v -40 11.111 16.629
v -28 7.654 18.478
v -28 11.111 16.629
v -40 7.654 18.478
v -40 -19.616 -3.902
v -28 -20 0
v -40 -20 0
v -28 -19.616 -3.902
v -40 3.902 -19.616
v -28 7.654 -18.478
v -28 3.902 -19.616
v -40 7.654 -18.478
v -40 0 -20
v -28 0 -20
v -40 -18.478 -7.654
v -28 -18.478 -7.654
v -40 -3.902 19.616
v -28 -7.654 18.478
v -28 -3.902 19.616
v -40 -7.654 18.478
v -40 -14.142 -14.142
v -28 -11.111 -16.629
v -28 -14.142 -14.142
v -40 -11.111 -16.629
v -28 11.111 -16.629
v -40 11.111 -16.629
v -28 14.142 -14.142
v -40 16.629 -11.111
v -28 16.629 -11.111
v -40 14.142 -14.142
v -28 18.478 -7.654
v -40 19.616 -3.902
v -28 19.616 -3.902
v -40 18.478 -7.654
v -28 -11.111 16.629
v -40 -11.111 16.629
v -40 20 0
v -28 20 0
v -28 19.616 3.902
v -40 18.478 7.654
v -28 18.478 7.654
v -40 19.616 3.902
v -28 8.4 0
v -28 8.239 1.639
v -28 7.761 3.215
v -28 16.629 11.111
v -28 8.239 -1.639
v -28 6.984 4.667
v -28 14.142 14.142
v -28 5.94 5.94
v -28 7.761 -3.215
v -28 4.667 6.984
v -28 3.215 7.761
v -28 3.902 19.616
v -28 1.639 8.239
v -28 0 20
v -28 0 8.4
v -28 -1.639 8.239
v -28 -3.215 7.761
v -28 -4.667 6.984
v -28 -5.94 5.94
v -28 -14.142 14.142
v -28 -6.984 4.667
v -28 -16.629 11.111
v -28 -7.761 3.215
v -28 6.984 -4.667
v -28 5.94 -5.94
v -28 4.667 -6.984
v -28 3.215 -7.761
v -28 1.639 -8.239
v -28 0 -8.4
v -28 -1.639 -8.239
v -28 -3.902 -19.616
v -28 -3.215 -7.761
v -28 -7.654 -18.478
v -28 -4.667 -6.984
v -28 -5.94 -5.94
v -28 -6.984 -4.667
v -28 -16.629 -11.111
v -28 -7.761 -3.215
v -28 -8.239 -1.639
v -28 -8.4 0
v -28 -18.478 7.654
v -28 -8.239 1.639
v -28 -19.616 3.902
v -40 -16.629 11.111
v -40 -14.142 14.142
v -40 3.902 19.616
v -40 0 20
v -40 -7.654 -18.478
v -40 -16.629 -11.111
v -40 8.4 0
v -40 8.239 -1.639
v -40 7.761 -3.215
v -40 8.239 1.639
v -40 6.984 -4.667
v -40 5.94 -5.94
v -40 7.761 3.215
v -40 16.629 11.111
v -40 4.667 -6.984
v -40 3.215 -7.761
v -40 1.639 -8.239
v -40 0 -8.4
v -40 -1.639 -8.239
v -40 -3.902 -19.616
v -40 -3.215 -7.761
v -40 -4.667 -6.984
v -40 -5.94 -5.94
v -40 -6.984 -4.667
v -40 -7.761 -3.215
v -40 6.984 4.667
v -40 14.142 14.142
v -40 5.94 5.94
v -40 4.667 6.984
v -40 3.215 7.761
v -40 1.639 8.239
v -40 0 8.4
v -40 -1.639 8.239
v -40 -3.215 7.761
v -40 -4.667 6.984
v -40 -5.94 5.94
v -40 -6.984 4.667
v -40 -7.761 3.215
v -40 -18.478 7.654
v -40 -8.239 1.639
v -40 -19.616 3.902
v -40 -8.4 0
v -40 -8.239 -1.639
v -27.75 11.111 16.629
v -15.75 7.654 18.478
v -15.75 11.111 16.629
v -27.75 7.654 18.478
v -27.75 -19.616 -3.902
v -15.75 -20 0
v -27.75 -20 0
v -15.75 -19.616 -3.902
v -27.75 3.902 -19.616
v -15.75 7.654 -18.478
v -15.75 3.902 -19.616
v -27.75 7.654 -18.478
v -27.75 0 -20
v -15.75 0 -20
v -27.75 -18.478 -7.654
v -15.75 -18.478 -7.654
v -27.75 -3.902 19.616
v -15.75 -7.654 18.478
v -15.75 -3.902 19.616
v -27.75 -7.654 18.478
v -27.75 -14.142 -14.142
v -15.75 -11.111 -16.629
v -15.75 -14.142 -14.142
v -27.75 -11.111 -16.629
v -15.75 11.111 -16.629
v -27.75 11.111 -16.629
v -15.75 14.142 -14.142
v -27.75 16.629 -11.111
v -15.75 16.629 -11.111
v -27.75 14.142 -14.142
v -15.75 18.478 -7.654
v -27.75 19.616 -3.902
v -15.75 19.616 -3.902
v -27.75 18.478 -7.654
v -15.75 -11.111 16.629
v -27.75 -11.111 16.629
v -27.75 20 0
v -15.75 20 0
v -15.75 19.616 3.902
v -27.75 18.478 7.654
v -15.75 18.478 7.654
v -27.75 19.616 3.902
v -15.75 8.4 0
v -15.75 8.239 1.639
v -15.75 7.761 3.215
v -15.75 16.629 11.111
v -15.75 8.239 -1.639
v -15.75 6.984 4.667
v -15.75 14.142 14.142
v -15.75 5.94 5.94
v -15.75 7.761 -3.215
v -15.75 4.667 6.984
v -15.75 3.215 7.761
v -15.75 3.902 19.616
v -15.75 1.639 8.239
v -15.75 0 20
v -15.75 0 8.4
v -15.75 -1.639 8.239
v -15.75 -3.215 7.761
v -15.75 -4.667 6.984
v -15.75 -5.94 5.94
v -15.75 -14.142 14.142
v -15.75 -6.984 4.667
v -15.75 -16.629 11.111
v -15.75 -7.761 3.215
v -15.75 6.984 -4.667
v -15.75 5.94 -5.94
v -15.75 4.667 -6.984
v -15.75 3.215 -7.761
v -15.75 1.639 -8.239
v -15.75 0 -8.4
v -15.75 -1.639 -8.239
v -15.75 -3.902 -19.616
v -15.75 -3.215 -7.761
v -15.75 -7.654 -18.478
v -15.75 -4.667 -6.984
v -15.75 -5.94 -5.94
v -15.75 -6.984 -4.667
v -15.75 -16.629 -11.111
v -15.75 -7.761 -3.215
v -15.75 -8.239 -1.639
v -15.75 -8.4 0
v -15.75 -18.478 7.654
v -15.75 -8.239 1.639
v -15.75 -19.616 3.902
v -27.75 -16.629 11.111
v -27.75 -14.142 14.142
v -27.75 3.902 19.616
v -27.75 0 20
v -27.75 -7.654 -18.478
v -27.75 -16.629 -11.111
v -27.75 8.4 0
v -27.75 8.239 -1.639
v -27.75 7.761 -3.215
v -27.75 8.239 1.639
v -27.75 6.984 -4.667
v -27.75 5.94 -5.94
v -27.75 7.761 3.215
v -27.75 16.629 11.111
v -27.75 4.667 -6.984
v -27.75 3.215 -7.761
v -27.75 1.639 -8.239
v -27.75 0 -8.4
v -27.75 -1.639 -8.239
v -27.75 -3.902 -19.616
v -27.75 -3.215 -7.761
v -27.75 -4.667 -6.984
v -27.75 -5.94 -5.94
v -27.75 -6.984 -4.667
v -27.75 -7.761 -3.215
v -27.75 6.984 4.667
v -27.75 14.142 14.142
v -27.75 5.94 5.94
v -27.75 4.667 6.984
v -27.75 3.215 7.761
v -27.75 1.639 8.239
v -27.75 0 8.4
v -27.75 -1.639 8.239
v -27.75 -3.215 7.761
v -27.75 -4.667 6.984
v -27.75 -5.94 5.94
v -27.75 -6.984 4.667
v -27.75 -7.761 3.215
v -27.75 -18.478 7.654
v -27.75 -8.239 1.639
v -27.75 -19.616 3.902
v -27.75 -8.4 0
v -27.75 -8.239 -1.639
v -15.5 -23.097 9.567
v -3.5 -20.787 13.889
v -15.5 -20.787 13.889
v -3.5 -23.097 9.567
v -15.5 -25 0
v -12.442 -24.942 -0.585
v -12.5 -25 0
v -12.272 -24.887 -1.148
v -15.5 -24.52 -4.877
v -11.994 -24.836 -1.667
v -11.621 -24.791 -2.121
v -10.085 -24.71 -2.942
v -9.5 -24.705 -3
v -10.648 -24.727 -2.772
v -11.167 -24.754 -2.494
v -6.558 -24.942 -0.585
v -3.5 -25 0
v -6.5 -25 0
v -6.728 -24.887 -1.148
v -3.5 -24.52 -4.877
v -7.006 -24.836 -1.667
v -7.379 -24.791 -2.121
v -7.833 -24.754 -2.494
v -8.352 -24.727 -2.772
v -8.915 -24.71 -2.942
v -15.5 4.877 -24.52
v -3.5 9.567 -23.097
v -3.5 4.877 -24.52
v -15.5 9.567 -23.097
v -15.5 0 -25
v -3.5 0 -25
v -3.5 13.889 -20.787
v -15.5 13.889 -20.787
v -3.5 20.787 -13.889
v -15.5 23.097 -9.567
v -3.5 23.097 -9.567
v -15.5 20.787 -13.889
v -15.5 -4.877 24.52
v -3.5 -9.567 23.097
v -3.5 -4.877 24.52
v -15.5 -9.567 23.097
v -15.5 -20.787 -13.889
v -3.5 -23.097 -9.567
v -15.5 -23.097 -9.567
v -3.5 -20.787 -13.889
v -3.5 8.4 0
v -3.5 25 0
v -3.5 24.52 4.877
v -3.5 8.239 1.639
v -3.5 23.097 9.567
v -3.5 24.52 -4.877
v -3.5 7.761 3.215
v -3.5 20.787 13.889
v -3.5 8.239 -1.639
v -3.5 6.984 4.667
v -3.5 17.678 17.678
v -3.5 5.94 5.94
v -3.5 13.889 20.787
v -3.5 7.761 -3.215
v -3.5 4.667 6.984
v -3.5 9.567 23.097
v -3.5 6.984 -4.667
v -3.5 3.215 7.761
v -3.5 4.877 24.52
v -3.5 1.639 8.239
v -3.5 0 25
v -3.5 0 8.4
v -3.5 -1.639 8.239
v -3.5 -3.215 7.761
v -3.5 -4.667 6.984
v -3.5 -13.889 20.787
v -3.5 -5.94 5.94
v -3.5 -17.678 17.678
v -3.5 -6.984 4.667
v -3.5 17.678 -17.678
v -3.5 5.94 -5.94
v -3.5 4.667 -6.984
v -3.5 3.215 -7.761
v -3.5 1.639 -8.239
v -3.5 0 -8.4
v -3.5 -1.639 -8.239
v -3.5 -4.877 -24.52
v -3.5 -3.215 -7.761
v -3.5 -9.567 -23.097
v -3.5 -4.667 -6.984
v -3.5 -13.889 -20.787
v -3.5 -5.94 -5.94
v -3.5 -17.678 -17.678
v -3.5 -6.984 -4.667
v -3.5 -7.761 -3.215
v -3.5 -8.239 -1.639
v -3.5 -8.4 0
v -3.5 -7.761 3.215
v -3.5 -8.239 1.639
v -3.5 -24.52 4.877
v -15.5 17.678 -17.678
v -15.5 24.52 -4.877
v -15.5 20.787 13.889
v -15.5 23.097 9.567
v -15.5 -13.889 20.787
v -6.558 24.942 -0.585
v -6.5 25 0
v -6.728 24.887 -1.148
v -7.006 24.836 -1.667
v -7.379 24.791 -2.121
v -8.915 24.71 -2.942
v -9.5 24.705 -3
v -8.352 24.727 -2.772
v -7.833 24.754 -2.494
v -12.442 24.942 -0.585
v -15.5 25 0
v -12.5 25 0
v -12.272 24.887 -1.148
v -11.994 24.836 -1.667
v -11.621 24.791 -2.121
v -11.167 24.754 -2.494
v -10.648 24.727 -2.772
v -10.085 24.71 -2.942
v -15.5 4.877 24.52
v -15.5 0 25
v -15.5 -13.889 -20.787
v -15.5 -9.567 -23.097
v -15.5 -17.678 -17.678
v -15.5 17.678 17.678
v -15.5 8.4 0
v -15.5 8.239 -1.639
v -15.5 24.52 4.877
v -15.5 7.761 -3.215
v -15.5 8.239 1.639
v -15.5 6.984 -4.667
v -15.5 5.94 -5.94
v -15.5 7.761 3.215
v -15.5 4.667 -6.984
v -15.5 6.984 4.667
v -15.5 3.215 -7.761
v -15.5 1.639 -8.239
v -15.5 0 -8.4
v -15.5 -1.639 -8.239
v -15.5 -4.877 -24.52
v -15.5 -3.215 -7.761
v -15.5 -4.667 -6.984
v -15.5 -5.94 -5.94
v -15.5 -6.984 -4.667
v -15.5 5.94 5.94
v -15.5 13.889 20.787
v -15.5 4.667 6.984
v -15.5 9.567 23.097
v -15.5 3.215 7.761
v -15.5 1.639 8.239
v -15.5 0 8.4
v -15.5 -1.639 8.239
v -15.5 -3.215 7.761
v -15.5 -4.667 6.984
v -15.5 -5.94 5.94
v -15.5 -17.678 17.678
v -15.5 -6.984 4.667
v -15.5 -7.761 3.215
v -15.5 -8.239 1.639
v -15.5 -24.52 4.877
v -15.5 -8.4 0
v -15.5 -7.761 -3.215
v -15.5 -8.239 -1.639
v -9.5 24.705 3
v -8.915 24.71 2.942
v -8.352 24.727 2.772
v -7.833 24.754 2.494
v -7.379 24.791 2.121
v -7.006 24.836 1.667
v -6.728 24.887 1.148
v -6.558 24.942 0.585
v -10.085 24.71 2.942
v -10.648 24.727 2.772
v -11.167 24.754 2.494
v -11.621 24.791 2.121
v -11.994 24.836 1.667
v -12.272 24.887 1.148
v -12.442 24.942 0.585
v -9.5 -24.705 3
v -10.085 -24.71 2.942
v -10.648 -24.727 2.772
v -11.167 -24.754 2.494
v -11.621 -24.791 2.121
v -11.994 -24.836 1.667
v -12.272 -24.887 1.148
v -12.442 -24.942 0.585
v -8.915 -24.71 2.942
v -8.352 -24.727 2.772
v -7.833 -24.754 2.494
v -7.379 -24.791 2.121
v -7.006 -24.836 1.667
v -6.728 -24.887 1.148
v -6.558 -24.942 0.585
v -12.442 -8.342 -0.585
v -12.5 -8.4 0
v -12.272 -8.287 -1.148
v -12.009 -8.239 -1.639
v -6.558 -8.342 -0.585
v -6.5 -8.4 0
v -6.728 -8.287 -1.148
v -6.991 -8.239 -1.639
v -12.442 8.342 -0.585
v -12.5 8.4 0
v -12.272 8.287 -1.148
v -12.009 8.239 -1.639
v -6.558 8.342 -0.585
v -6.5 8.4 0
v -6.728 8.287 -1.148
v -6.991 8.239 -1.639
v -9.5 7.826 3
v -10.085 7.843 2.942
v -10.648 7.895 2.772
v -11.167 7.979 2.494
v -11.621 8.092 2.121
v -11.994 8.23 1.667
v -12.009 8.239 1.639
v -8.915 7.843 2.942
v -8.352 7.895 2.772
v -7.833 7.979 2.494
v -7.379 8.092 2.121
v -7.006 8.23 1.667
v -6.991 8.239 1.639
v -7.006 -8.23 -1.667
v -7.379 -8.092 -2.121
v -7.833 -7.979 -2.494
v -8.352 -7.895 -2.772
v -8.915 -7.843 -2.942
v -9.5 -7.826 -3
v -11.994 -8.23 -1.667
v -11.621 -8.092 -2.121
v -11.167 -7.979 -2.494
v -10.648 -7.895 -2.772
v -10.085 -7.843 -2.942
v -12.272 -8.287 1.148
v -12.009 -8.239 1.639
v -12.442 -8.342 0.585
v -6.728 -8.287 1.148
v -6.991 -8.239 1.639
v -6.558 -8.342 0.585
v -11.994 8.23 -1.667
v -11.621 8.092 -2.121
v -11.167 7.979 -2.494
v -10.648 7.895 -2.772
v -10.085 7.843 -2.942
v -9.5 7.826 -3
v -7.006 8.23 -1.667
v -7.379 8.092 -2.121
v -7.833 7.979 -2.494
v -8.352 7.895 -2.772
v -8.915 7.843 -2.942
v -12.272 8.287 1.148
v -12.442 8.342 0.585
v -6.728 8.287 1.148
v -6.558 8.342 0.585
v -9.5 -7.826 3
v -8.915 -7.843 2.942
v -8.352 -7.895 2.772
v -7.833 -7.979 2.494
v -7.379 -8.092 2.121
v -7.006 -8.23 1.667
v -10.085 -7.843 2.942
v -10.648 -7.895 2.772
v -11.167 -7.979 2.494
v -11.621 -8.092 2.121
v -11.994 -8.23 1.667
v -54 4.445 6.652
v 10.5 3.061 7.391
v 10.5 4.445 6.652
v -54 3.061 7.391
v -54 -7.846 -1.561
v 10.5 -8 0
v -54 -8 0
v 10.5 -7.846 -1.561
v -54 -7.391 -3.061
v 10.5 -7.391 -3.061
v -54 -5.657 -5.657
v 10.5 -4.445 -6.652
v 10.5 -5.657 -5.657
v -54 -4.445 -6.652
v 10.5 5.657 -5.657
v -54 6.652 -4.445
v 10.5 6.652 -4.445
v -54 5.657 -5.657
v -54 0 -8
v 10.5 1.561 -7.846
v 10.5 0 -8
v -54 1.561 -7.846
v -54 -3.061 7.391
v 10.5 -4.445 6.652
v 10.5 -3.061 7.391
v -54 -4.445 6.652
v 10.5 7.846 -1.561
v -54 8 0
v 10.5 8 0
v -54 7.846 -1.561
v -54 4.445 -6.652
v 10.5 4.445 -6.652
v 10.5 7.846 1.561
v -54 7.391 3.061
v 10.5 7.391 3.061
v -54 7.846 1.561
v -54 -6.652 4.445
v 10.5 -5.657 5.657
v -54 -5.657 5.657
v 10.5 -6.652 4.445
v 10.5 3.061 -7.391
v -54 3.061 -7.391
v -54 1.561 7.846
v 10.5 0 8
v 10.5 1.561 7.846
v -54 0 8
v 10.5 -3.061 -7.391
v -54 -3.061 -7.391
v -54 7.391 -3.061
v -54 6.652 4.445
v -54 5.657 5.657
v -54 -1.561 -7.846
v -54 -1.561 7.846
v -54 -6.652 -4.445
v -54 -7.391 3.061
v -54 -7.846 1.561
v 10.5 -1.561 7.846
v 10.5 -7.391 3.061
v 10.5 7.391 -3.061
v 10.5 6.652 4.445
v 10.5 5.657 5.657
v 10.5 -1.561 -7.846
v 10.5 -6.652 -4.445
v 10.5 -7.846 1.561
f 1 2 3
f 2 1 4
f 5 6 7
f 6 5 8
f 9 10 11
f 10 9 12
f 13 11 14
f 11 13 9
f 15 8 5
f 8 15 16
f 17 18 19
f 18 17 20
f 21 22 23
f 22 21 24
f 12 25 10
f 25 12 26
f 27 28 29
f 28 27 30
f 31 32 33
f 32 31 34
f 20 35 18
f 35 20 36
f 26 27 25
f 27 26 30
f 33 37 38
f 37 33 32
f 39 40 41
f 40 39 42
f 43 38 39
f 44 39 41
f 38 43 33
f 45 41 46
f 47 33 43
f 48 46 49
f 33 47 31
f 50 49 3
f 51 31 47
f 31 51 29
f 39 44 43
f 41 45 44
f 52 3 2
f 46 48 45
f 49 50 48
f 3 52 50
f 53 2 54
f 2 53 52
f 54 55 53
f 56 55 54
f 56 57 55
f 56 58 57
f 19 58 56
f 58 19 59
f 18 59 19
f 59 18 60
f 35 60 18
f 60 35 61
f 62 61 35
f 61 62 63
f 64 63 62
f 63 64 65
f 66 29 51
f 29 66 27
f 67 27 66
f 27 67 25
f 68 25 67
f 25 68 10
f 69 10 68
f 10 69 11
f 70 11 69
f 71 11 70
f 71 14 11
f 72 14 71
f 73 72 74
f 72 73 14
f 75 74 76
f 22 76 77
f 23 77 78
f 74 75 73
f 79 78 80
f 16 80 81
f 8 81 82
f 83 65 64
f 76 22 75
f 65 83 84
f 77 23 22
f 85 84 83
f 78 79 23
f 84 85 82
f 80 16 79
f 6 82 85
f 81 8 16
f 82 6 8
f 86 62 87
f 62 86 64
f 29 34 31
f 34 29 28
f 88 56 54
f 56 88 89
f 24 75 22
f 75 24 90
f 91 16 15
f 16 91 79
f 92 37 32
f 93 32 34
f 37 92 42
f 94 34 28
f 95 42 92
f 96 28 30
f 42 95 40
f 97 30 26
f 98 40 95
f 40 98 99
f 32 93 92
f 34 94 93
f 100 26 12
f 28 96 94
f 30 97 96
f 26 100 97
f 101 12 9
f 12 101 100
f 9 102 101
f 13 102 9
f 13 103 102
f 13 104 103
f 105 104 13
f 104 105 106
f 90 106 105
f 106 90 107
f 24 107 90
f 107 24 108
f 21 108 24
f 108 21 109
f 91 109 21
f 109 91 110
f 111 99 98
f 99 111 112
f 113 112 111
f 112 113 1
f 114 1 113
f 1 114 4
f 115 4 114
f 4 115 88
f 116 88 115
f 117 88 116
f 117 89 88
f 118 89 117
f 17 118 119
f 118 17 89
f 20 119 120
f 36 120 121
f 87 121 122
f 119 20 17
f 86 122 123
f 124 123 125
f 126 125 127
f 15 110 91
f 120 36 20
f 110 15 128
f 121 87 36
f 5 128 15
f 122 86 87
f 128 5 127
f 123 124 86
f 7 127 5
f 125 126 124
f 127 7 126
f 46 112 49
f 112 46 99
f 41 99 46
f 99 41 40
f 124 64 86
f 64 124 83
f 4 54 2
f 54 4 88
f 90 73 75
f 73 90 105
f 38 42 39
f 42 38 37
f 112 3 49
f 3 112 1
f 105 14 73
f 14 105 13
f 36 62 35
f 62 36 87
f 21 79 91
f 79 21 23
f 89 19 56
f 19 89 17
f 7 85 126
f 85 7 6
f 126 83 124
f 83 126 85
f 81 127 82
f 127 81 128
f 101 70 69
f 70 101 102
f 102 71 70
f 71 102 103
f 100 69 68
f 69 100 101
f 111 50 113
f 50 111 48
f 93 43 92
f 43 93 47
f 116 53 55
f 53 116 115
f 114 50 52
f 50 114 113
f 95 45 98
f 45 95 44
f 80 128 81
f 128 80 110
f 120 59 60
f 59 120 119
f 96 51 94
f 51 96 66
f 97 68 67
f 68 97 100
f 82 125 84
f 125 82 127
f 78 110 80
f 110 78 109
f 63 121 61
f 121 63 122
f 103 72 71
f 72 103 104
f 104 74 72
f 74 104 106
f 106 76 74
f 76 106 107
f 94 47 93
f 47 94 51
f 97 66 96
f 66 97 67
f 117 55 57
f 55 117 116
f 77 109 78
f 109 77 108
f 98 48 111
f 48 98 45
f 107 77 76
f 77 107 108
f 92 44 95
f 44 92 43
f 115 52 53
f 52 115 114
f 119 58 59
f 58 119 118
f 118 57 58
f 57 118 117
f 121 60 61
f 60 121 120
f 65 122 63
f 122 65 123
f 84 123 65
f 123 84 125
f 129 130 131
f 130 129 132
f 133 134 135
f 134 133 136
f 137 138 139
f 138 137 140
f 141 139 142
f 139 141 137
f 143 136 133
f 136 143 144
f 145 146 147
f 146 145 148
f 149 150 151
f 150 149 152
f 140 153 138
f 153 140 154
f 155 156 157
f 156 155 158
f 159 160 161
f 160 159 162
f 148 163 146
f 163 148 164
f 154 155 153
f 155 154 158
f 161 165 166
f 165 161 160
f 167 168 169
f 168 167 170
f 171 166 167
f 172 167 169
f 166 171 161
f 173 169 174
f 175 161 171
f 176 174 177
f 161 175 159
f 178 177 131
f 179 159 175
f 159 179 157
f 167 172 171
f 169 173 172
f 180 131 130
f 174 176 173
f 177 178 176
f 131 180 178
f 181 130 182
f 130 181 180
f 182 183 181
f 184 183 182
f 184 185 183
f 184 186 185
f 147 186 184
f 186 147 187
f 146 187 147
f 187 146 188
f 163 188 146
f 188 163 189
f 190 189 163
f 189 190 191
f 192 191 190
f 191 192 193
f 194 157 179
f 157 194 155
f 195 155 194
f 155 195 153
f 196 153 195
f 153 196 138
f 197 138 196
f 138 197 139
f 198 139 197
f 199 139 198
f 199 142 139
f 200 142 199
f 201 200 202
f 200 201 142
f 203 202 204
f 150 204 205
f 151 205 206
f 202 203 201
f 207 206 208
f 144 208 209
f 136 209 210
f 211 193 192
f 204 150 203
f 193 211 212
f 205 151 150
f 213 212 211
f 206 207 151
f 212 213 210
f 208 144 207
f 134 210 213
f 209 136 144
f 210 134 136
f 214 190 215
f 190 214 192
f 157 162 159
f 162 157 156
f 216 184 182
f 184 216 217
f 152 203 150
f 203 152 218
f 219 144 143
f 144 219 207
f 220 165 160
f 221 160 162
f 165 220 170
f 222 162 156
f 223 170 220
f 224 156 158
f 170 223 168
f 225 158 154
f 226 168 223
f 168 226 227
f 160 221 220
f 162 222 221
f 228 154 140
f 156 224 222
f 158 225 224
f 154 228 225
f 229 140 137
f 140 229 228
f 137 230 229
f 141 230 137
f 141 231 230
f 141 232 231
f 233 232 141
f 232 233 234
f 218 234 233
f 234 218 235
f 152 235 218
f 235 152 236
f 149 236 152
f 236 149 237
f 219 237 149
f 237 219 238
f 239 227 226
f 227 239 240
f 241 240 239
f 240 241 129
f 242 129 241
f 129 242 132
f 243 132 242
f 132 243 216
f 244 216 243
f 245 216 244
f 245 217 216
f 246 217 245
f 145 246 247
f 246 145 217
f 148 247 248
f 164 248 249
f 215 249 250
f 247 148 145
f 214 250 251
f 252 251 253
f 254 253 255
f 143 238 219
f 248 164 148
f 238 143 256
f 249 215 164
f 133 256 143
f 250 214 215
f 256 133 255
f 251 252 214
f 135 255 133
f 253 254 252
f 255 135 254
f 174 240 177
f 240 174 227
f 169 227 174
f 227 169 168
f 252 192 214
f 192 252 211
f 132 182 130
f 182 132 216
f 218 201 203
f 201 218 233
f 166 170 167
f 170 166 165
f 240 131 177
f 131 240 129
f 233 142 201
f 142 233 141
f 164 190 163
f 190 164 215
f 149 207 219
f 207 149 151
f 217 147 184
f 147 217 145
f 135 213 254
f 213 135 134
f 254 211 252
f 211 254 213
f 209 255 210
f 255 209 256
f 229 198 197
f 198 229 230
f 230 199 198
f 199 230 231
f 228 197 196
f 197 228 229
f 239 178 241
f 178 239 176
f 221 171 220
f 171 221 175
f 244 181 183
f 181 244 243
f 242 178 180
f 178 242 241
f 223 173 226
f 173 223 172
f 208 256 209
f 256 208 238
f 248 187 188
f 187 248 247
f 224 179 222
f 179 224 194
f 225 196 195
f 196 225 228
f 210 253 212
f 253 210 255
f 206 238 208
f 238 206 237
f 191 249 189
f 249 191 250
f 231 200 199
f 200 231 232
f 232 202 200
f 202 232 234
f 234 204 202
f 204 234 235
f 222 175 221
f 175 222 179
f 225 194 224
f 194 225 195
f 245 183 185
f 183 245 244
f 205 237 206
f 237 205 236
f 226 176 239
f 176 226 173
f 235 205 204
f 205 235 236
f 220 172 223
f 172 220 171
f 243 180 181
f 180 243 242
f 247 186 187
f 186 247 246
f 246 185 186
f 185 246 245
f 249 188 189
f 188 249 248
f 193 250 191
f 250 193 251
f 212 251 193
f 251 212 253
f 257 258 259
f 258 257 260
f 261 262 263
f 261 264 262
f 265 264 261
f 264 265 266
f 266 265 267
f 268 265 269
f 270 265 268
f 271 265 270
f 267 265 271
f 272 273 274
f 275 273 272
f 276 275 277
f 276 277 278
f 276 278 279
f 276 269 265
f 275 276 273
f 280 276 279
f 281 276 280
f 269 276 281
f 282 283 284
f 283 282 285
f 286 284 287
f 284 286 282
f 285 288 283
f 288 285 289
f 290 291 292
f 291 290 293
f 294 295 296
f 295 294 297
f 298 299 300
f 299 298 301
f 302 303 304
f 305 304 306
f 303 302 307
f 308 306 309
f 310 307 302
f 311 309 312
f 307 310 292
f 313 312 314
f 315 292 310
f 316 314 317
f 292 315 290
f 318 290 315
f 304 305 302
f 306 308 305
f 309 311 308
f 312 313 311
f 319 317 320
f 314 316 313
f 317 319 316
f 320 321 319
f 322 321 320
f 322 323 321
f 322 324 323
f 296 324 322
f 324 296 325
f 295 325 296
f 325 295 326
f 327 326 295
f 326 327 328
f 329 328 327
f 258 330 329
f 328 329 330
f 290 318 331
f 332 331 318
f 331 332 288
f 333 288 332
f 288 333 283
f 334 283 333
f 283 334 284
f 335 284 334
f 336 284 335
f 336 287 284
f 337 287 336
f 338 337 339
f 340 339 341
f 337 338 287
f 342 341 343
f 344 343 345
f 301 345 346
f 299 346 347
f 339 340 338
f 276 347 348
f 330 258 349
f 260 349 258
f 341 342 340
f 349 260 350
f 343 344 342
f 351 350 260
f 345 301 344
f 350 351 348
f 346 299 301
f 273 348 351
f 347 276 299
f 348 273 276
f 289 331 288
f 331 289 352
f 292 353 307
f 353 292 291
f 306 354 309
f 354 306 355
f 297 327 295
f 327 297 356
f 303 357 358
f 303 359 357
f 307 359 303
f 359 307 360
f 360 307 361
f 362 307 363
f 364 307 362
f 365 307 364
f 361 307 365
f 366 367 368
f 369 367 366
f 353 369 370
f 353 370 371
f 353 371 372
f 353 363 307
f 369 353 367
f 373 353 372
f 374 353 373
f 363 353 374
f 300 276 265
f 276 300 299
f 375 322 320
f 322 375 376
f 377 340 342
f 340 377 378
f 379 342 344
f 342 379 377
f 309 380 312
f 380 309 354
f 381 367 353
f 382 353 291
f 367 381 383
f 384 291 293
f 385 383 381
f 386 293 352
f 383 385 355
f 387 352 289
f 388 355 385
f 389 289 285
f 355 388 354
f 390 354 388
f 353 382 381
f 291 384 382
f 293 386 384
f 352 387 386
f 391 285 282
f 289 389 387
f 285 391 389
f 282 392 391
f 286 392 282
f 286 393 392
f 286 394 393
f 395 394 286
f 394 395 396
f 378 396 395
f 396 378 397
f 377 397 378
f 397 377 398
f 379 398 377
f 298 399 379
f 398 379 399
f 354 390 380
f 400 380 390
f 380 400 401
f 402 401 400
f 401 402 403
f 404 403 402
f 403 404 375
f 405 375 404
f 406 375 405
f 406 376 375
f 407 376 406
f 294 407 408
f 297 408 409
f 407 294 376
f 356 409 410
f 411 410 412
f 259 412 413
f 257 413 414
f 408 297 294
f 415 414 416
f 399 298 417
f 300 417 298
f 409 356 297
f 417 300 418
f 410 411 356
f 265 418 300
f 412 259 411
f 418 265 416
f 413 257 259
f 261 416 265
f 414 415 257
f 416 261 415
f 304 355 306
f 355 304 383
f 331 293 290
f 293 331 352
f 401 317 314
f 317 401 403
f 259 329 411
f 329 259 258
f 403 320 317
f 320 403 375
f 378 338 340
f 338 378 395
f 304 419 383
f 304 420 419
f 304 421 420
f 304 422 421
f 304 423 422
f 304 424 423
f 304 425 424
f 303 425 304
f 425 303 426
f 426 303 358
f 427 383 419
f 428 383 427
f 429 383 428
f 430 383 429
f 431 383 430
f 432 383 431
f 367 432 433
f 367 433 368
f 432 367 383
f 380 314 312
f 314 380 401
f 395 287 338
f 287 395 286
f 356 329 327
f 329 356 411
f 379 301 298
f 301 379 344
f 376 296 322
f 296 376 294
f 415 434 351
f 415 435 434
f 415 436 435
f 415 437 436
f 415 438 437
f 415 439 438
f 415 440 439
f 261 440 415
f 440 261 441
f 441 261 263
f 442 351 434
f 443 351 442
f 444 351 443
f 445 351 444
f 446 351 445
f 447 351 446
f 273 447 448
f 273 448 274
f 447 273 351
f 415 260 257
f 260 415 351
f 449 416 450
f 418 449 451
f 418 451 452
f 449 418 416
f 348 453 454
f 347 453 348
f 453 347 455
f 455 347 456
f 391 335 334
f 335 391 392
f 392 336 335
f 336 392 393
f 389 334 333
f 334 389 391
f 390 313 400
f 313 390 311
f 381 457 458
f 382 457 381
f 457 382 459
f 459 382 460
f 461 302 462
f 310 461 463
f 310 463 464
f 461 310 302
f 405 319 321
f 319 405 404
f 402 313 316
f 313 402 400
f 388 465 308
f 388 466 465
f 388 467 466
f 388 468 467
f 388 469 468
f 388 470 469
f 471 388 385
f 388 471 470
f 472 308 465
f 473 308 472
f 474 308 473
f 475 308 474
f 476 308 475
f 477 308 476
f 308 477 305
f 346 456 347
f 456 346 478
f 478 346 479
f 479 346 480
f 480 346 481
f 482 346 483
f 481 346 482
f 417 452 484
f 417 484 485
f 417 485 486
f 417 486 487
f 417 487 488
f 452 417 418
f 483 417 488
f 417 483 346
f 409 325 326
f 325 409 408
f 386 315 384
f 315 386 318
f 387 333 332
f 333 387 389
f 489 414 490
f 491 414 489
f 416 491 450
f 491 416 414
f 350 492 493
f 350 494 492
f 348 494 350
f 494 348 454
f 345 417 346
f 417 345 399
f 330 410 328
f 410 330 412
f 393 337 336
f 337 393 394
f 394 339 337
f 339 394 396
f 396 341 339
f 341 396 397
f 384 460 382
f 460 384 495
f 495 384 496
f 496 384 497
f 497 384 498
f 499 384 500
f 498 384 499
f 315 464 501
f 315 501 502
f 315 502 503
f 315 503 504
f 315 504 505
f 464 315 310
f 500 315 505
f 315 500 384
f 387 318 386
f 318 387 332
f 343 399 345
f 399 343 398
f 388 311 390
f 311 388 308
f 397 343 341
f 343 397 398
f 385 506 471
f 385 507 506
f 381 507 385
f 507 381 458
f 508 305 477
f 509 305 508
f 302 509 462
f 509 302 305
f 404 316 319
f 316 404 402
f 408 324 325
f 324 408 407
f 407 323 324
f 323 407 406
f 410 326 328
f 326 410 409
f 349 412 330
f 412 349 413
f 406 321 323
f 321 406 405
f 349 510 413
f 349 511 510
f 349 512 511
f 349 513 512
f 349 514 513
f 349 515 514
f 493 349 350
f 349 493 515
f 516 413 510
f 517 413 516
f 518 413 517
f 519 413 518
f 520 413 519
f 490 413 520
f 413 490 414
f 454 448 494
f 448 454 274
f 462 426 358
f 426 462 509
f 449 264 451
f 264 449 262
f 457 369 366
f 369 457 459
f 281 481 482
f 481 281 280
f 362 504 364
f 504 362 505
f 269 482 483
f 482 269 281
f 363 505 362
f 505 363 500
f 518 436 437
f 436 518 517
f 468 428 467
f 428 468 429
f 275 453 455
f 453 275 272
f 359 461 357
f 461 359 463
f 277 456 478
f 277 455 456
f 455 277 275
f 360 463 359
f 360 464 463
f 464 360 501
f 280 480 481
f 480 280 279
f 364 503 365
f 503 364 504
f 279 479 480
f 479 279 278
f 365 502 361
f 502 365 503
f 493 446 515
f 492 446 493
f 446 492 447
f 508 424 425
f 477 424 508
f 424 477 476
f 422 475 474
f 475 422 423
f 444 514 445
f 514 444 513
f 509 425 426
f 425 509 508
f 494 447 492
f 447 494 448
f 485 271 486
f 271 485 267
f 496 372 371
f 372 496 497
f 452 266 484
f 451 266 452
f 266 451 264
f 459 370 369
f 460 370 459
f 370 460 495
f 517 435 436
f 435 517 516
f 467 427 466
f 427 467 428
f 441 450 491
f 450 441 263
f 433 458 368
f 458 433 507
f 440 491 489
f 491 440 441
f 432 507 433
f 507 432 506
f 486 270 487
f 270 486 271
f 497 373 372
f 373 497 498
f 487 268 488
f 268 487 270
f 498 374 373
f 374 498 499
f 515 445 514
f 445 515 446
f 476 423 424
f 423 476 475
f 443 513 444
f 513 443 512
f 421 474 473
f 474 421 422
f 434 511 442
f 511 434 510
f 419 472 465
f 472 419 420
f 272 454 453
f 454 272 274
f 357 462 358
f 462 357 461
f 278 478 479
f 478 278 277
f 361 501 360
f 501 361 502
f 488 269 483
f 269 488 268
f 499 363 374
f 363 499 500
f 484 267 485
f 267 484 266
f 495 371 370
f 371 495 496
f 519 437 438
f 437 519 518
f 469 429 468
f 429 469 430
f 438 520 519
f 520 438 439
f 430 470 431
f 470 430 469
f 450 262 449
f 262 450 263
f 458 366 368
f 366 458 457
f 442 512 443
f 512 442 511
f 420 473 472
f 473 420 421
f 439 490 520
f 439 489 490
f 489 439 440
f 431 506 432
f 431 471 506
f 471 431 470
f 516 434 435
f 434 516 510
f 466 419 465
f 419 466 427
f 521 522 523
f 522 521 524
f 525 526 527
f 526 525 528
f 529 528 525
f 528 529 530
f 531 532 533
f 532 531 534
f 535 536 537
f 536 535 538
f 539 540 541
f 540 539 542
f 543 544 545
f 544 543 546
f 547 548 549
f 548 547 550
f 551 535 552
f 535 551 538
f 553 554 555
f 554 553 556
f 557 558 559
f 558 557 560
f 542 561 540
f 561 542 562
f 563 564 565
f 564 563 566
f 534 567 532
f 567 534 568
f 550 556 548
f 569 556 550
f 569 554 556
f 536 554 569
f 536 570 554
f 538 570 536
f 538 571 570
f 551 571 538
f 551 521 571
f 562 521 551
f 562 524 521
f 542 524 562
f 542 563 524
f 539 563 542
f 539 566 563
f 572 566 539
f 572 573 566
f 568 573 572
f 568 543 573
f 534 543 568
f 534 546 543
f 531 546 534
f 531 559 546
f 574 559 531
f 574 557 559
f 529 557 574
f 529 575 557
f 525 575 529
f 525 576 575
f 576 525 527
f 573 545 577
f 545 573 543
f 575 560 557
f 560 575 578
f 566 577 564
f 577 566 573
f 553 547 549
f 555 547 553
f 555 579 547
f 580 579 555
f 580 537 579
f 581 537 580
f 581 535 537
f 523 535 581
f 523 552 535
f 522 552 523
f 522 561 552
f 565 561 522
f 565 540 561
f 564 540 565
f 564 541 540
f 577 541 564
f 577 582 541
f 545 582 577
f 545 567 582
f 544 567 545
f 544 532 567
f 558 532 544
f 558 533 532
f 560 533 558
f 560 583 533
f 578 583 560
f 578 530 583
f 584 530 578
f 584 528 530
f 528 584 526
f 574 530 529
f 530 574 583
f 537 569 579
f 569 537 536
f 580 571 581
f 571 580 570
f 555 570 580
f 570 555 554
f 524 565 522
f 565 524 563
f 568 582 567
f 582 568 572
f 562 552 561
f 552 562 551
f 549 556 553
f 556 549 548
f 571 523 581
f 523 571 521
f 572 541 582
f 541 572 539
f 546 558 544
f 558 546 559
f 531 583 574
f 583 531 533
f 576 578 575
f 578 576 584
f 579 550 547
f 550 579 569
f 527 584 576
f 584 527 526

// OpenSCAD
$fn = 32;

// ------------------------------------------------------------------------
// Shaft with rings and collars: d16 shaft, 3 rings
// Every part is its own module, assembly() places them once.
// ------------------------------------------------------------------------

// --- part 1 ---
module shaft() {
  translate([0, 0, -32.25]) cylinder(h = 64.5, d = 16);
}

// --- part 2 ---
module spacer_a() {
  difference() {
      translate([0, 0, 0]) cylinder(h = 12, d = 40);
      translate([0, 0, -1]) cylinder(h = 14, d = 16.8);
    }
}

// --- part 3 ---
module spacer_b() {
  difference() {
      translate([0, 0, 0]) cylinder(h = 12, d = 40);
      translate([0, 0, -1]) cylinder(h = 14, d = 16.8);
    }
}

// --- part 4 ---
module collar_a() {
  difference() {
    cylinder(h = 12, d = 50);
    translate([0, 0, -1]) cylinder(h = 14, d = 16.8);
    translate([0, 0, 6]) rotate([90, 0, 0]) cylinder(h = 52, d = 6, center = true);
  }
}

// --- assembly ---
module assembly() {
  translate([-21.75, 0, 0]) rotate([0, 90, 0]) shaft();
  translate([-40, 0, 0]) rotate([0, 90, 0]) spacer_a();
  translate([-27.75, 0, 0]) rotate([0, 90, 0]) spacer_b();
  translate([-15.5, 0, 0]) rotate([0, 90, 0]) collar_a();
}

assembly();
